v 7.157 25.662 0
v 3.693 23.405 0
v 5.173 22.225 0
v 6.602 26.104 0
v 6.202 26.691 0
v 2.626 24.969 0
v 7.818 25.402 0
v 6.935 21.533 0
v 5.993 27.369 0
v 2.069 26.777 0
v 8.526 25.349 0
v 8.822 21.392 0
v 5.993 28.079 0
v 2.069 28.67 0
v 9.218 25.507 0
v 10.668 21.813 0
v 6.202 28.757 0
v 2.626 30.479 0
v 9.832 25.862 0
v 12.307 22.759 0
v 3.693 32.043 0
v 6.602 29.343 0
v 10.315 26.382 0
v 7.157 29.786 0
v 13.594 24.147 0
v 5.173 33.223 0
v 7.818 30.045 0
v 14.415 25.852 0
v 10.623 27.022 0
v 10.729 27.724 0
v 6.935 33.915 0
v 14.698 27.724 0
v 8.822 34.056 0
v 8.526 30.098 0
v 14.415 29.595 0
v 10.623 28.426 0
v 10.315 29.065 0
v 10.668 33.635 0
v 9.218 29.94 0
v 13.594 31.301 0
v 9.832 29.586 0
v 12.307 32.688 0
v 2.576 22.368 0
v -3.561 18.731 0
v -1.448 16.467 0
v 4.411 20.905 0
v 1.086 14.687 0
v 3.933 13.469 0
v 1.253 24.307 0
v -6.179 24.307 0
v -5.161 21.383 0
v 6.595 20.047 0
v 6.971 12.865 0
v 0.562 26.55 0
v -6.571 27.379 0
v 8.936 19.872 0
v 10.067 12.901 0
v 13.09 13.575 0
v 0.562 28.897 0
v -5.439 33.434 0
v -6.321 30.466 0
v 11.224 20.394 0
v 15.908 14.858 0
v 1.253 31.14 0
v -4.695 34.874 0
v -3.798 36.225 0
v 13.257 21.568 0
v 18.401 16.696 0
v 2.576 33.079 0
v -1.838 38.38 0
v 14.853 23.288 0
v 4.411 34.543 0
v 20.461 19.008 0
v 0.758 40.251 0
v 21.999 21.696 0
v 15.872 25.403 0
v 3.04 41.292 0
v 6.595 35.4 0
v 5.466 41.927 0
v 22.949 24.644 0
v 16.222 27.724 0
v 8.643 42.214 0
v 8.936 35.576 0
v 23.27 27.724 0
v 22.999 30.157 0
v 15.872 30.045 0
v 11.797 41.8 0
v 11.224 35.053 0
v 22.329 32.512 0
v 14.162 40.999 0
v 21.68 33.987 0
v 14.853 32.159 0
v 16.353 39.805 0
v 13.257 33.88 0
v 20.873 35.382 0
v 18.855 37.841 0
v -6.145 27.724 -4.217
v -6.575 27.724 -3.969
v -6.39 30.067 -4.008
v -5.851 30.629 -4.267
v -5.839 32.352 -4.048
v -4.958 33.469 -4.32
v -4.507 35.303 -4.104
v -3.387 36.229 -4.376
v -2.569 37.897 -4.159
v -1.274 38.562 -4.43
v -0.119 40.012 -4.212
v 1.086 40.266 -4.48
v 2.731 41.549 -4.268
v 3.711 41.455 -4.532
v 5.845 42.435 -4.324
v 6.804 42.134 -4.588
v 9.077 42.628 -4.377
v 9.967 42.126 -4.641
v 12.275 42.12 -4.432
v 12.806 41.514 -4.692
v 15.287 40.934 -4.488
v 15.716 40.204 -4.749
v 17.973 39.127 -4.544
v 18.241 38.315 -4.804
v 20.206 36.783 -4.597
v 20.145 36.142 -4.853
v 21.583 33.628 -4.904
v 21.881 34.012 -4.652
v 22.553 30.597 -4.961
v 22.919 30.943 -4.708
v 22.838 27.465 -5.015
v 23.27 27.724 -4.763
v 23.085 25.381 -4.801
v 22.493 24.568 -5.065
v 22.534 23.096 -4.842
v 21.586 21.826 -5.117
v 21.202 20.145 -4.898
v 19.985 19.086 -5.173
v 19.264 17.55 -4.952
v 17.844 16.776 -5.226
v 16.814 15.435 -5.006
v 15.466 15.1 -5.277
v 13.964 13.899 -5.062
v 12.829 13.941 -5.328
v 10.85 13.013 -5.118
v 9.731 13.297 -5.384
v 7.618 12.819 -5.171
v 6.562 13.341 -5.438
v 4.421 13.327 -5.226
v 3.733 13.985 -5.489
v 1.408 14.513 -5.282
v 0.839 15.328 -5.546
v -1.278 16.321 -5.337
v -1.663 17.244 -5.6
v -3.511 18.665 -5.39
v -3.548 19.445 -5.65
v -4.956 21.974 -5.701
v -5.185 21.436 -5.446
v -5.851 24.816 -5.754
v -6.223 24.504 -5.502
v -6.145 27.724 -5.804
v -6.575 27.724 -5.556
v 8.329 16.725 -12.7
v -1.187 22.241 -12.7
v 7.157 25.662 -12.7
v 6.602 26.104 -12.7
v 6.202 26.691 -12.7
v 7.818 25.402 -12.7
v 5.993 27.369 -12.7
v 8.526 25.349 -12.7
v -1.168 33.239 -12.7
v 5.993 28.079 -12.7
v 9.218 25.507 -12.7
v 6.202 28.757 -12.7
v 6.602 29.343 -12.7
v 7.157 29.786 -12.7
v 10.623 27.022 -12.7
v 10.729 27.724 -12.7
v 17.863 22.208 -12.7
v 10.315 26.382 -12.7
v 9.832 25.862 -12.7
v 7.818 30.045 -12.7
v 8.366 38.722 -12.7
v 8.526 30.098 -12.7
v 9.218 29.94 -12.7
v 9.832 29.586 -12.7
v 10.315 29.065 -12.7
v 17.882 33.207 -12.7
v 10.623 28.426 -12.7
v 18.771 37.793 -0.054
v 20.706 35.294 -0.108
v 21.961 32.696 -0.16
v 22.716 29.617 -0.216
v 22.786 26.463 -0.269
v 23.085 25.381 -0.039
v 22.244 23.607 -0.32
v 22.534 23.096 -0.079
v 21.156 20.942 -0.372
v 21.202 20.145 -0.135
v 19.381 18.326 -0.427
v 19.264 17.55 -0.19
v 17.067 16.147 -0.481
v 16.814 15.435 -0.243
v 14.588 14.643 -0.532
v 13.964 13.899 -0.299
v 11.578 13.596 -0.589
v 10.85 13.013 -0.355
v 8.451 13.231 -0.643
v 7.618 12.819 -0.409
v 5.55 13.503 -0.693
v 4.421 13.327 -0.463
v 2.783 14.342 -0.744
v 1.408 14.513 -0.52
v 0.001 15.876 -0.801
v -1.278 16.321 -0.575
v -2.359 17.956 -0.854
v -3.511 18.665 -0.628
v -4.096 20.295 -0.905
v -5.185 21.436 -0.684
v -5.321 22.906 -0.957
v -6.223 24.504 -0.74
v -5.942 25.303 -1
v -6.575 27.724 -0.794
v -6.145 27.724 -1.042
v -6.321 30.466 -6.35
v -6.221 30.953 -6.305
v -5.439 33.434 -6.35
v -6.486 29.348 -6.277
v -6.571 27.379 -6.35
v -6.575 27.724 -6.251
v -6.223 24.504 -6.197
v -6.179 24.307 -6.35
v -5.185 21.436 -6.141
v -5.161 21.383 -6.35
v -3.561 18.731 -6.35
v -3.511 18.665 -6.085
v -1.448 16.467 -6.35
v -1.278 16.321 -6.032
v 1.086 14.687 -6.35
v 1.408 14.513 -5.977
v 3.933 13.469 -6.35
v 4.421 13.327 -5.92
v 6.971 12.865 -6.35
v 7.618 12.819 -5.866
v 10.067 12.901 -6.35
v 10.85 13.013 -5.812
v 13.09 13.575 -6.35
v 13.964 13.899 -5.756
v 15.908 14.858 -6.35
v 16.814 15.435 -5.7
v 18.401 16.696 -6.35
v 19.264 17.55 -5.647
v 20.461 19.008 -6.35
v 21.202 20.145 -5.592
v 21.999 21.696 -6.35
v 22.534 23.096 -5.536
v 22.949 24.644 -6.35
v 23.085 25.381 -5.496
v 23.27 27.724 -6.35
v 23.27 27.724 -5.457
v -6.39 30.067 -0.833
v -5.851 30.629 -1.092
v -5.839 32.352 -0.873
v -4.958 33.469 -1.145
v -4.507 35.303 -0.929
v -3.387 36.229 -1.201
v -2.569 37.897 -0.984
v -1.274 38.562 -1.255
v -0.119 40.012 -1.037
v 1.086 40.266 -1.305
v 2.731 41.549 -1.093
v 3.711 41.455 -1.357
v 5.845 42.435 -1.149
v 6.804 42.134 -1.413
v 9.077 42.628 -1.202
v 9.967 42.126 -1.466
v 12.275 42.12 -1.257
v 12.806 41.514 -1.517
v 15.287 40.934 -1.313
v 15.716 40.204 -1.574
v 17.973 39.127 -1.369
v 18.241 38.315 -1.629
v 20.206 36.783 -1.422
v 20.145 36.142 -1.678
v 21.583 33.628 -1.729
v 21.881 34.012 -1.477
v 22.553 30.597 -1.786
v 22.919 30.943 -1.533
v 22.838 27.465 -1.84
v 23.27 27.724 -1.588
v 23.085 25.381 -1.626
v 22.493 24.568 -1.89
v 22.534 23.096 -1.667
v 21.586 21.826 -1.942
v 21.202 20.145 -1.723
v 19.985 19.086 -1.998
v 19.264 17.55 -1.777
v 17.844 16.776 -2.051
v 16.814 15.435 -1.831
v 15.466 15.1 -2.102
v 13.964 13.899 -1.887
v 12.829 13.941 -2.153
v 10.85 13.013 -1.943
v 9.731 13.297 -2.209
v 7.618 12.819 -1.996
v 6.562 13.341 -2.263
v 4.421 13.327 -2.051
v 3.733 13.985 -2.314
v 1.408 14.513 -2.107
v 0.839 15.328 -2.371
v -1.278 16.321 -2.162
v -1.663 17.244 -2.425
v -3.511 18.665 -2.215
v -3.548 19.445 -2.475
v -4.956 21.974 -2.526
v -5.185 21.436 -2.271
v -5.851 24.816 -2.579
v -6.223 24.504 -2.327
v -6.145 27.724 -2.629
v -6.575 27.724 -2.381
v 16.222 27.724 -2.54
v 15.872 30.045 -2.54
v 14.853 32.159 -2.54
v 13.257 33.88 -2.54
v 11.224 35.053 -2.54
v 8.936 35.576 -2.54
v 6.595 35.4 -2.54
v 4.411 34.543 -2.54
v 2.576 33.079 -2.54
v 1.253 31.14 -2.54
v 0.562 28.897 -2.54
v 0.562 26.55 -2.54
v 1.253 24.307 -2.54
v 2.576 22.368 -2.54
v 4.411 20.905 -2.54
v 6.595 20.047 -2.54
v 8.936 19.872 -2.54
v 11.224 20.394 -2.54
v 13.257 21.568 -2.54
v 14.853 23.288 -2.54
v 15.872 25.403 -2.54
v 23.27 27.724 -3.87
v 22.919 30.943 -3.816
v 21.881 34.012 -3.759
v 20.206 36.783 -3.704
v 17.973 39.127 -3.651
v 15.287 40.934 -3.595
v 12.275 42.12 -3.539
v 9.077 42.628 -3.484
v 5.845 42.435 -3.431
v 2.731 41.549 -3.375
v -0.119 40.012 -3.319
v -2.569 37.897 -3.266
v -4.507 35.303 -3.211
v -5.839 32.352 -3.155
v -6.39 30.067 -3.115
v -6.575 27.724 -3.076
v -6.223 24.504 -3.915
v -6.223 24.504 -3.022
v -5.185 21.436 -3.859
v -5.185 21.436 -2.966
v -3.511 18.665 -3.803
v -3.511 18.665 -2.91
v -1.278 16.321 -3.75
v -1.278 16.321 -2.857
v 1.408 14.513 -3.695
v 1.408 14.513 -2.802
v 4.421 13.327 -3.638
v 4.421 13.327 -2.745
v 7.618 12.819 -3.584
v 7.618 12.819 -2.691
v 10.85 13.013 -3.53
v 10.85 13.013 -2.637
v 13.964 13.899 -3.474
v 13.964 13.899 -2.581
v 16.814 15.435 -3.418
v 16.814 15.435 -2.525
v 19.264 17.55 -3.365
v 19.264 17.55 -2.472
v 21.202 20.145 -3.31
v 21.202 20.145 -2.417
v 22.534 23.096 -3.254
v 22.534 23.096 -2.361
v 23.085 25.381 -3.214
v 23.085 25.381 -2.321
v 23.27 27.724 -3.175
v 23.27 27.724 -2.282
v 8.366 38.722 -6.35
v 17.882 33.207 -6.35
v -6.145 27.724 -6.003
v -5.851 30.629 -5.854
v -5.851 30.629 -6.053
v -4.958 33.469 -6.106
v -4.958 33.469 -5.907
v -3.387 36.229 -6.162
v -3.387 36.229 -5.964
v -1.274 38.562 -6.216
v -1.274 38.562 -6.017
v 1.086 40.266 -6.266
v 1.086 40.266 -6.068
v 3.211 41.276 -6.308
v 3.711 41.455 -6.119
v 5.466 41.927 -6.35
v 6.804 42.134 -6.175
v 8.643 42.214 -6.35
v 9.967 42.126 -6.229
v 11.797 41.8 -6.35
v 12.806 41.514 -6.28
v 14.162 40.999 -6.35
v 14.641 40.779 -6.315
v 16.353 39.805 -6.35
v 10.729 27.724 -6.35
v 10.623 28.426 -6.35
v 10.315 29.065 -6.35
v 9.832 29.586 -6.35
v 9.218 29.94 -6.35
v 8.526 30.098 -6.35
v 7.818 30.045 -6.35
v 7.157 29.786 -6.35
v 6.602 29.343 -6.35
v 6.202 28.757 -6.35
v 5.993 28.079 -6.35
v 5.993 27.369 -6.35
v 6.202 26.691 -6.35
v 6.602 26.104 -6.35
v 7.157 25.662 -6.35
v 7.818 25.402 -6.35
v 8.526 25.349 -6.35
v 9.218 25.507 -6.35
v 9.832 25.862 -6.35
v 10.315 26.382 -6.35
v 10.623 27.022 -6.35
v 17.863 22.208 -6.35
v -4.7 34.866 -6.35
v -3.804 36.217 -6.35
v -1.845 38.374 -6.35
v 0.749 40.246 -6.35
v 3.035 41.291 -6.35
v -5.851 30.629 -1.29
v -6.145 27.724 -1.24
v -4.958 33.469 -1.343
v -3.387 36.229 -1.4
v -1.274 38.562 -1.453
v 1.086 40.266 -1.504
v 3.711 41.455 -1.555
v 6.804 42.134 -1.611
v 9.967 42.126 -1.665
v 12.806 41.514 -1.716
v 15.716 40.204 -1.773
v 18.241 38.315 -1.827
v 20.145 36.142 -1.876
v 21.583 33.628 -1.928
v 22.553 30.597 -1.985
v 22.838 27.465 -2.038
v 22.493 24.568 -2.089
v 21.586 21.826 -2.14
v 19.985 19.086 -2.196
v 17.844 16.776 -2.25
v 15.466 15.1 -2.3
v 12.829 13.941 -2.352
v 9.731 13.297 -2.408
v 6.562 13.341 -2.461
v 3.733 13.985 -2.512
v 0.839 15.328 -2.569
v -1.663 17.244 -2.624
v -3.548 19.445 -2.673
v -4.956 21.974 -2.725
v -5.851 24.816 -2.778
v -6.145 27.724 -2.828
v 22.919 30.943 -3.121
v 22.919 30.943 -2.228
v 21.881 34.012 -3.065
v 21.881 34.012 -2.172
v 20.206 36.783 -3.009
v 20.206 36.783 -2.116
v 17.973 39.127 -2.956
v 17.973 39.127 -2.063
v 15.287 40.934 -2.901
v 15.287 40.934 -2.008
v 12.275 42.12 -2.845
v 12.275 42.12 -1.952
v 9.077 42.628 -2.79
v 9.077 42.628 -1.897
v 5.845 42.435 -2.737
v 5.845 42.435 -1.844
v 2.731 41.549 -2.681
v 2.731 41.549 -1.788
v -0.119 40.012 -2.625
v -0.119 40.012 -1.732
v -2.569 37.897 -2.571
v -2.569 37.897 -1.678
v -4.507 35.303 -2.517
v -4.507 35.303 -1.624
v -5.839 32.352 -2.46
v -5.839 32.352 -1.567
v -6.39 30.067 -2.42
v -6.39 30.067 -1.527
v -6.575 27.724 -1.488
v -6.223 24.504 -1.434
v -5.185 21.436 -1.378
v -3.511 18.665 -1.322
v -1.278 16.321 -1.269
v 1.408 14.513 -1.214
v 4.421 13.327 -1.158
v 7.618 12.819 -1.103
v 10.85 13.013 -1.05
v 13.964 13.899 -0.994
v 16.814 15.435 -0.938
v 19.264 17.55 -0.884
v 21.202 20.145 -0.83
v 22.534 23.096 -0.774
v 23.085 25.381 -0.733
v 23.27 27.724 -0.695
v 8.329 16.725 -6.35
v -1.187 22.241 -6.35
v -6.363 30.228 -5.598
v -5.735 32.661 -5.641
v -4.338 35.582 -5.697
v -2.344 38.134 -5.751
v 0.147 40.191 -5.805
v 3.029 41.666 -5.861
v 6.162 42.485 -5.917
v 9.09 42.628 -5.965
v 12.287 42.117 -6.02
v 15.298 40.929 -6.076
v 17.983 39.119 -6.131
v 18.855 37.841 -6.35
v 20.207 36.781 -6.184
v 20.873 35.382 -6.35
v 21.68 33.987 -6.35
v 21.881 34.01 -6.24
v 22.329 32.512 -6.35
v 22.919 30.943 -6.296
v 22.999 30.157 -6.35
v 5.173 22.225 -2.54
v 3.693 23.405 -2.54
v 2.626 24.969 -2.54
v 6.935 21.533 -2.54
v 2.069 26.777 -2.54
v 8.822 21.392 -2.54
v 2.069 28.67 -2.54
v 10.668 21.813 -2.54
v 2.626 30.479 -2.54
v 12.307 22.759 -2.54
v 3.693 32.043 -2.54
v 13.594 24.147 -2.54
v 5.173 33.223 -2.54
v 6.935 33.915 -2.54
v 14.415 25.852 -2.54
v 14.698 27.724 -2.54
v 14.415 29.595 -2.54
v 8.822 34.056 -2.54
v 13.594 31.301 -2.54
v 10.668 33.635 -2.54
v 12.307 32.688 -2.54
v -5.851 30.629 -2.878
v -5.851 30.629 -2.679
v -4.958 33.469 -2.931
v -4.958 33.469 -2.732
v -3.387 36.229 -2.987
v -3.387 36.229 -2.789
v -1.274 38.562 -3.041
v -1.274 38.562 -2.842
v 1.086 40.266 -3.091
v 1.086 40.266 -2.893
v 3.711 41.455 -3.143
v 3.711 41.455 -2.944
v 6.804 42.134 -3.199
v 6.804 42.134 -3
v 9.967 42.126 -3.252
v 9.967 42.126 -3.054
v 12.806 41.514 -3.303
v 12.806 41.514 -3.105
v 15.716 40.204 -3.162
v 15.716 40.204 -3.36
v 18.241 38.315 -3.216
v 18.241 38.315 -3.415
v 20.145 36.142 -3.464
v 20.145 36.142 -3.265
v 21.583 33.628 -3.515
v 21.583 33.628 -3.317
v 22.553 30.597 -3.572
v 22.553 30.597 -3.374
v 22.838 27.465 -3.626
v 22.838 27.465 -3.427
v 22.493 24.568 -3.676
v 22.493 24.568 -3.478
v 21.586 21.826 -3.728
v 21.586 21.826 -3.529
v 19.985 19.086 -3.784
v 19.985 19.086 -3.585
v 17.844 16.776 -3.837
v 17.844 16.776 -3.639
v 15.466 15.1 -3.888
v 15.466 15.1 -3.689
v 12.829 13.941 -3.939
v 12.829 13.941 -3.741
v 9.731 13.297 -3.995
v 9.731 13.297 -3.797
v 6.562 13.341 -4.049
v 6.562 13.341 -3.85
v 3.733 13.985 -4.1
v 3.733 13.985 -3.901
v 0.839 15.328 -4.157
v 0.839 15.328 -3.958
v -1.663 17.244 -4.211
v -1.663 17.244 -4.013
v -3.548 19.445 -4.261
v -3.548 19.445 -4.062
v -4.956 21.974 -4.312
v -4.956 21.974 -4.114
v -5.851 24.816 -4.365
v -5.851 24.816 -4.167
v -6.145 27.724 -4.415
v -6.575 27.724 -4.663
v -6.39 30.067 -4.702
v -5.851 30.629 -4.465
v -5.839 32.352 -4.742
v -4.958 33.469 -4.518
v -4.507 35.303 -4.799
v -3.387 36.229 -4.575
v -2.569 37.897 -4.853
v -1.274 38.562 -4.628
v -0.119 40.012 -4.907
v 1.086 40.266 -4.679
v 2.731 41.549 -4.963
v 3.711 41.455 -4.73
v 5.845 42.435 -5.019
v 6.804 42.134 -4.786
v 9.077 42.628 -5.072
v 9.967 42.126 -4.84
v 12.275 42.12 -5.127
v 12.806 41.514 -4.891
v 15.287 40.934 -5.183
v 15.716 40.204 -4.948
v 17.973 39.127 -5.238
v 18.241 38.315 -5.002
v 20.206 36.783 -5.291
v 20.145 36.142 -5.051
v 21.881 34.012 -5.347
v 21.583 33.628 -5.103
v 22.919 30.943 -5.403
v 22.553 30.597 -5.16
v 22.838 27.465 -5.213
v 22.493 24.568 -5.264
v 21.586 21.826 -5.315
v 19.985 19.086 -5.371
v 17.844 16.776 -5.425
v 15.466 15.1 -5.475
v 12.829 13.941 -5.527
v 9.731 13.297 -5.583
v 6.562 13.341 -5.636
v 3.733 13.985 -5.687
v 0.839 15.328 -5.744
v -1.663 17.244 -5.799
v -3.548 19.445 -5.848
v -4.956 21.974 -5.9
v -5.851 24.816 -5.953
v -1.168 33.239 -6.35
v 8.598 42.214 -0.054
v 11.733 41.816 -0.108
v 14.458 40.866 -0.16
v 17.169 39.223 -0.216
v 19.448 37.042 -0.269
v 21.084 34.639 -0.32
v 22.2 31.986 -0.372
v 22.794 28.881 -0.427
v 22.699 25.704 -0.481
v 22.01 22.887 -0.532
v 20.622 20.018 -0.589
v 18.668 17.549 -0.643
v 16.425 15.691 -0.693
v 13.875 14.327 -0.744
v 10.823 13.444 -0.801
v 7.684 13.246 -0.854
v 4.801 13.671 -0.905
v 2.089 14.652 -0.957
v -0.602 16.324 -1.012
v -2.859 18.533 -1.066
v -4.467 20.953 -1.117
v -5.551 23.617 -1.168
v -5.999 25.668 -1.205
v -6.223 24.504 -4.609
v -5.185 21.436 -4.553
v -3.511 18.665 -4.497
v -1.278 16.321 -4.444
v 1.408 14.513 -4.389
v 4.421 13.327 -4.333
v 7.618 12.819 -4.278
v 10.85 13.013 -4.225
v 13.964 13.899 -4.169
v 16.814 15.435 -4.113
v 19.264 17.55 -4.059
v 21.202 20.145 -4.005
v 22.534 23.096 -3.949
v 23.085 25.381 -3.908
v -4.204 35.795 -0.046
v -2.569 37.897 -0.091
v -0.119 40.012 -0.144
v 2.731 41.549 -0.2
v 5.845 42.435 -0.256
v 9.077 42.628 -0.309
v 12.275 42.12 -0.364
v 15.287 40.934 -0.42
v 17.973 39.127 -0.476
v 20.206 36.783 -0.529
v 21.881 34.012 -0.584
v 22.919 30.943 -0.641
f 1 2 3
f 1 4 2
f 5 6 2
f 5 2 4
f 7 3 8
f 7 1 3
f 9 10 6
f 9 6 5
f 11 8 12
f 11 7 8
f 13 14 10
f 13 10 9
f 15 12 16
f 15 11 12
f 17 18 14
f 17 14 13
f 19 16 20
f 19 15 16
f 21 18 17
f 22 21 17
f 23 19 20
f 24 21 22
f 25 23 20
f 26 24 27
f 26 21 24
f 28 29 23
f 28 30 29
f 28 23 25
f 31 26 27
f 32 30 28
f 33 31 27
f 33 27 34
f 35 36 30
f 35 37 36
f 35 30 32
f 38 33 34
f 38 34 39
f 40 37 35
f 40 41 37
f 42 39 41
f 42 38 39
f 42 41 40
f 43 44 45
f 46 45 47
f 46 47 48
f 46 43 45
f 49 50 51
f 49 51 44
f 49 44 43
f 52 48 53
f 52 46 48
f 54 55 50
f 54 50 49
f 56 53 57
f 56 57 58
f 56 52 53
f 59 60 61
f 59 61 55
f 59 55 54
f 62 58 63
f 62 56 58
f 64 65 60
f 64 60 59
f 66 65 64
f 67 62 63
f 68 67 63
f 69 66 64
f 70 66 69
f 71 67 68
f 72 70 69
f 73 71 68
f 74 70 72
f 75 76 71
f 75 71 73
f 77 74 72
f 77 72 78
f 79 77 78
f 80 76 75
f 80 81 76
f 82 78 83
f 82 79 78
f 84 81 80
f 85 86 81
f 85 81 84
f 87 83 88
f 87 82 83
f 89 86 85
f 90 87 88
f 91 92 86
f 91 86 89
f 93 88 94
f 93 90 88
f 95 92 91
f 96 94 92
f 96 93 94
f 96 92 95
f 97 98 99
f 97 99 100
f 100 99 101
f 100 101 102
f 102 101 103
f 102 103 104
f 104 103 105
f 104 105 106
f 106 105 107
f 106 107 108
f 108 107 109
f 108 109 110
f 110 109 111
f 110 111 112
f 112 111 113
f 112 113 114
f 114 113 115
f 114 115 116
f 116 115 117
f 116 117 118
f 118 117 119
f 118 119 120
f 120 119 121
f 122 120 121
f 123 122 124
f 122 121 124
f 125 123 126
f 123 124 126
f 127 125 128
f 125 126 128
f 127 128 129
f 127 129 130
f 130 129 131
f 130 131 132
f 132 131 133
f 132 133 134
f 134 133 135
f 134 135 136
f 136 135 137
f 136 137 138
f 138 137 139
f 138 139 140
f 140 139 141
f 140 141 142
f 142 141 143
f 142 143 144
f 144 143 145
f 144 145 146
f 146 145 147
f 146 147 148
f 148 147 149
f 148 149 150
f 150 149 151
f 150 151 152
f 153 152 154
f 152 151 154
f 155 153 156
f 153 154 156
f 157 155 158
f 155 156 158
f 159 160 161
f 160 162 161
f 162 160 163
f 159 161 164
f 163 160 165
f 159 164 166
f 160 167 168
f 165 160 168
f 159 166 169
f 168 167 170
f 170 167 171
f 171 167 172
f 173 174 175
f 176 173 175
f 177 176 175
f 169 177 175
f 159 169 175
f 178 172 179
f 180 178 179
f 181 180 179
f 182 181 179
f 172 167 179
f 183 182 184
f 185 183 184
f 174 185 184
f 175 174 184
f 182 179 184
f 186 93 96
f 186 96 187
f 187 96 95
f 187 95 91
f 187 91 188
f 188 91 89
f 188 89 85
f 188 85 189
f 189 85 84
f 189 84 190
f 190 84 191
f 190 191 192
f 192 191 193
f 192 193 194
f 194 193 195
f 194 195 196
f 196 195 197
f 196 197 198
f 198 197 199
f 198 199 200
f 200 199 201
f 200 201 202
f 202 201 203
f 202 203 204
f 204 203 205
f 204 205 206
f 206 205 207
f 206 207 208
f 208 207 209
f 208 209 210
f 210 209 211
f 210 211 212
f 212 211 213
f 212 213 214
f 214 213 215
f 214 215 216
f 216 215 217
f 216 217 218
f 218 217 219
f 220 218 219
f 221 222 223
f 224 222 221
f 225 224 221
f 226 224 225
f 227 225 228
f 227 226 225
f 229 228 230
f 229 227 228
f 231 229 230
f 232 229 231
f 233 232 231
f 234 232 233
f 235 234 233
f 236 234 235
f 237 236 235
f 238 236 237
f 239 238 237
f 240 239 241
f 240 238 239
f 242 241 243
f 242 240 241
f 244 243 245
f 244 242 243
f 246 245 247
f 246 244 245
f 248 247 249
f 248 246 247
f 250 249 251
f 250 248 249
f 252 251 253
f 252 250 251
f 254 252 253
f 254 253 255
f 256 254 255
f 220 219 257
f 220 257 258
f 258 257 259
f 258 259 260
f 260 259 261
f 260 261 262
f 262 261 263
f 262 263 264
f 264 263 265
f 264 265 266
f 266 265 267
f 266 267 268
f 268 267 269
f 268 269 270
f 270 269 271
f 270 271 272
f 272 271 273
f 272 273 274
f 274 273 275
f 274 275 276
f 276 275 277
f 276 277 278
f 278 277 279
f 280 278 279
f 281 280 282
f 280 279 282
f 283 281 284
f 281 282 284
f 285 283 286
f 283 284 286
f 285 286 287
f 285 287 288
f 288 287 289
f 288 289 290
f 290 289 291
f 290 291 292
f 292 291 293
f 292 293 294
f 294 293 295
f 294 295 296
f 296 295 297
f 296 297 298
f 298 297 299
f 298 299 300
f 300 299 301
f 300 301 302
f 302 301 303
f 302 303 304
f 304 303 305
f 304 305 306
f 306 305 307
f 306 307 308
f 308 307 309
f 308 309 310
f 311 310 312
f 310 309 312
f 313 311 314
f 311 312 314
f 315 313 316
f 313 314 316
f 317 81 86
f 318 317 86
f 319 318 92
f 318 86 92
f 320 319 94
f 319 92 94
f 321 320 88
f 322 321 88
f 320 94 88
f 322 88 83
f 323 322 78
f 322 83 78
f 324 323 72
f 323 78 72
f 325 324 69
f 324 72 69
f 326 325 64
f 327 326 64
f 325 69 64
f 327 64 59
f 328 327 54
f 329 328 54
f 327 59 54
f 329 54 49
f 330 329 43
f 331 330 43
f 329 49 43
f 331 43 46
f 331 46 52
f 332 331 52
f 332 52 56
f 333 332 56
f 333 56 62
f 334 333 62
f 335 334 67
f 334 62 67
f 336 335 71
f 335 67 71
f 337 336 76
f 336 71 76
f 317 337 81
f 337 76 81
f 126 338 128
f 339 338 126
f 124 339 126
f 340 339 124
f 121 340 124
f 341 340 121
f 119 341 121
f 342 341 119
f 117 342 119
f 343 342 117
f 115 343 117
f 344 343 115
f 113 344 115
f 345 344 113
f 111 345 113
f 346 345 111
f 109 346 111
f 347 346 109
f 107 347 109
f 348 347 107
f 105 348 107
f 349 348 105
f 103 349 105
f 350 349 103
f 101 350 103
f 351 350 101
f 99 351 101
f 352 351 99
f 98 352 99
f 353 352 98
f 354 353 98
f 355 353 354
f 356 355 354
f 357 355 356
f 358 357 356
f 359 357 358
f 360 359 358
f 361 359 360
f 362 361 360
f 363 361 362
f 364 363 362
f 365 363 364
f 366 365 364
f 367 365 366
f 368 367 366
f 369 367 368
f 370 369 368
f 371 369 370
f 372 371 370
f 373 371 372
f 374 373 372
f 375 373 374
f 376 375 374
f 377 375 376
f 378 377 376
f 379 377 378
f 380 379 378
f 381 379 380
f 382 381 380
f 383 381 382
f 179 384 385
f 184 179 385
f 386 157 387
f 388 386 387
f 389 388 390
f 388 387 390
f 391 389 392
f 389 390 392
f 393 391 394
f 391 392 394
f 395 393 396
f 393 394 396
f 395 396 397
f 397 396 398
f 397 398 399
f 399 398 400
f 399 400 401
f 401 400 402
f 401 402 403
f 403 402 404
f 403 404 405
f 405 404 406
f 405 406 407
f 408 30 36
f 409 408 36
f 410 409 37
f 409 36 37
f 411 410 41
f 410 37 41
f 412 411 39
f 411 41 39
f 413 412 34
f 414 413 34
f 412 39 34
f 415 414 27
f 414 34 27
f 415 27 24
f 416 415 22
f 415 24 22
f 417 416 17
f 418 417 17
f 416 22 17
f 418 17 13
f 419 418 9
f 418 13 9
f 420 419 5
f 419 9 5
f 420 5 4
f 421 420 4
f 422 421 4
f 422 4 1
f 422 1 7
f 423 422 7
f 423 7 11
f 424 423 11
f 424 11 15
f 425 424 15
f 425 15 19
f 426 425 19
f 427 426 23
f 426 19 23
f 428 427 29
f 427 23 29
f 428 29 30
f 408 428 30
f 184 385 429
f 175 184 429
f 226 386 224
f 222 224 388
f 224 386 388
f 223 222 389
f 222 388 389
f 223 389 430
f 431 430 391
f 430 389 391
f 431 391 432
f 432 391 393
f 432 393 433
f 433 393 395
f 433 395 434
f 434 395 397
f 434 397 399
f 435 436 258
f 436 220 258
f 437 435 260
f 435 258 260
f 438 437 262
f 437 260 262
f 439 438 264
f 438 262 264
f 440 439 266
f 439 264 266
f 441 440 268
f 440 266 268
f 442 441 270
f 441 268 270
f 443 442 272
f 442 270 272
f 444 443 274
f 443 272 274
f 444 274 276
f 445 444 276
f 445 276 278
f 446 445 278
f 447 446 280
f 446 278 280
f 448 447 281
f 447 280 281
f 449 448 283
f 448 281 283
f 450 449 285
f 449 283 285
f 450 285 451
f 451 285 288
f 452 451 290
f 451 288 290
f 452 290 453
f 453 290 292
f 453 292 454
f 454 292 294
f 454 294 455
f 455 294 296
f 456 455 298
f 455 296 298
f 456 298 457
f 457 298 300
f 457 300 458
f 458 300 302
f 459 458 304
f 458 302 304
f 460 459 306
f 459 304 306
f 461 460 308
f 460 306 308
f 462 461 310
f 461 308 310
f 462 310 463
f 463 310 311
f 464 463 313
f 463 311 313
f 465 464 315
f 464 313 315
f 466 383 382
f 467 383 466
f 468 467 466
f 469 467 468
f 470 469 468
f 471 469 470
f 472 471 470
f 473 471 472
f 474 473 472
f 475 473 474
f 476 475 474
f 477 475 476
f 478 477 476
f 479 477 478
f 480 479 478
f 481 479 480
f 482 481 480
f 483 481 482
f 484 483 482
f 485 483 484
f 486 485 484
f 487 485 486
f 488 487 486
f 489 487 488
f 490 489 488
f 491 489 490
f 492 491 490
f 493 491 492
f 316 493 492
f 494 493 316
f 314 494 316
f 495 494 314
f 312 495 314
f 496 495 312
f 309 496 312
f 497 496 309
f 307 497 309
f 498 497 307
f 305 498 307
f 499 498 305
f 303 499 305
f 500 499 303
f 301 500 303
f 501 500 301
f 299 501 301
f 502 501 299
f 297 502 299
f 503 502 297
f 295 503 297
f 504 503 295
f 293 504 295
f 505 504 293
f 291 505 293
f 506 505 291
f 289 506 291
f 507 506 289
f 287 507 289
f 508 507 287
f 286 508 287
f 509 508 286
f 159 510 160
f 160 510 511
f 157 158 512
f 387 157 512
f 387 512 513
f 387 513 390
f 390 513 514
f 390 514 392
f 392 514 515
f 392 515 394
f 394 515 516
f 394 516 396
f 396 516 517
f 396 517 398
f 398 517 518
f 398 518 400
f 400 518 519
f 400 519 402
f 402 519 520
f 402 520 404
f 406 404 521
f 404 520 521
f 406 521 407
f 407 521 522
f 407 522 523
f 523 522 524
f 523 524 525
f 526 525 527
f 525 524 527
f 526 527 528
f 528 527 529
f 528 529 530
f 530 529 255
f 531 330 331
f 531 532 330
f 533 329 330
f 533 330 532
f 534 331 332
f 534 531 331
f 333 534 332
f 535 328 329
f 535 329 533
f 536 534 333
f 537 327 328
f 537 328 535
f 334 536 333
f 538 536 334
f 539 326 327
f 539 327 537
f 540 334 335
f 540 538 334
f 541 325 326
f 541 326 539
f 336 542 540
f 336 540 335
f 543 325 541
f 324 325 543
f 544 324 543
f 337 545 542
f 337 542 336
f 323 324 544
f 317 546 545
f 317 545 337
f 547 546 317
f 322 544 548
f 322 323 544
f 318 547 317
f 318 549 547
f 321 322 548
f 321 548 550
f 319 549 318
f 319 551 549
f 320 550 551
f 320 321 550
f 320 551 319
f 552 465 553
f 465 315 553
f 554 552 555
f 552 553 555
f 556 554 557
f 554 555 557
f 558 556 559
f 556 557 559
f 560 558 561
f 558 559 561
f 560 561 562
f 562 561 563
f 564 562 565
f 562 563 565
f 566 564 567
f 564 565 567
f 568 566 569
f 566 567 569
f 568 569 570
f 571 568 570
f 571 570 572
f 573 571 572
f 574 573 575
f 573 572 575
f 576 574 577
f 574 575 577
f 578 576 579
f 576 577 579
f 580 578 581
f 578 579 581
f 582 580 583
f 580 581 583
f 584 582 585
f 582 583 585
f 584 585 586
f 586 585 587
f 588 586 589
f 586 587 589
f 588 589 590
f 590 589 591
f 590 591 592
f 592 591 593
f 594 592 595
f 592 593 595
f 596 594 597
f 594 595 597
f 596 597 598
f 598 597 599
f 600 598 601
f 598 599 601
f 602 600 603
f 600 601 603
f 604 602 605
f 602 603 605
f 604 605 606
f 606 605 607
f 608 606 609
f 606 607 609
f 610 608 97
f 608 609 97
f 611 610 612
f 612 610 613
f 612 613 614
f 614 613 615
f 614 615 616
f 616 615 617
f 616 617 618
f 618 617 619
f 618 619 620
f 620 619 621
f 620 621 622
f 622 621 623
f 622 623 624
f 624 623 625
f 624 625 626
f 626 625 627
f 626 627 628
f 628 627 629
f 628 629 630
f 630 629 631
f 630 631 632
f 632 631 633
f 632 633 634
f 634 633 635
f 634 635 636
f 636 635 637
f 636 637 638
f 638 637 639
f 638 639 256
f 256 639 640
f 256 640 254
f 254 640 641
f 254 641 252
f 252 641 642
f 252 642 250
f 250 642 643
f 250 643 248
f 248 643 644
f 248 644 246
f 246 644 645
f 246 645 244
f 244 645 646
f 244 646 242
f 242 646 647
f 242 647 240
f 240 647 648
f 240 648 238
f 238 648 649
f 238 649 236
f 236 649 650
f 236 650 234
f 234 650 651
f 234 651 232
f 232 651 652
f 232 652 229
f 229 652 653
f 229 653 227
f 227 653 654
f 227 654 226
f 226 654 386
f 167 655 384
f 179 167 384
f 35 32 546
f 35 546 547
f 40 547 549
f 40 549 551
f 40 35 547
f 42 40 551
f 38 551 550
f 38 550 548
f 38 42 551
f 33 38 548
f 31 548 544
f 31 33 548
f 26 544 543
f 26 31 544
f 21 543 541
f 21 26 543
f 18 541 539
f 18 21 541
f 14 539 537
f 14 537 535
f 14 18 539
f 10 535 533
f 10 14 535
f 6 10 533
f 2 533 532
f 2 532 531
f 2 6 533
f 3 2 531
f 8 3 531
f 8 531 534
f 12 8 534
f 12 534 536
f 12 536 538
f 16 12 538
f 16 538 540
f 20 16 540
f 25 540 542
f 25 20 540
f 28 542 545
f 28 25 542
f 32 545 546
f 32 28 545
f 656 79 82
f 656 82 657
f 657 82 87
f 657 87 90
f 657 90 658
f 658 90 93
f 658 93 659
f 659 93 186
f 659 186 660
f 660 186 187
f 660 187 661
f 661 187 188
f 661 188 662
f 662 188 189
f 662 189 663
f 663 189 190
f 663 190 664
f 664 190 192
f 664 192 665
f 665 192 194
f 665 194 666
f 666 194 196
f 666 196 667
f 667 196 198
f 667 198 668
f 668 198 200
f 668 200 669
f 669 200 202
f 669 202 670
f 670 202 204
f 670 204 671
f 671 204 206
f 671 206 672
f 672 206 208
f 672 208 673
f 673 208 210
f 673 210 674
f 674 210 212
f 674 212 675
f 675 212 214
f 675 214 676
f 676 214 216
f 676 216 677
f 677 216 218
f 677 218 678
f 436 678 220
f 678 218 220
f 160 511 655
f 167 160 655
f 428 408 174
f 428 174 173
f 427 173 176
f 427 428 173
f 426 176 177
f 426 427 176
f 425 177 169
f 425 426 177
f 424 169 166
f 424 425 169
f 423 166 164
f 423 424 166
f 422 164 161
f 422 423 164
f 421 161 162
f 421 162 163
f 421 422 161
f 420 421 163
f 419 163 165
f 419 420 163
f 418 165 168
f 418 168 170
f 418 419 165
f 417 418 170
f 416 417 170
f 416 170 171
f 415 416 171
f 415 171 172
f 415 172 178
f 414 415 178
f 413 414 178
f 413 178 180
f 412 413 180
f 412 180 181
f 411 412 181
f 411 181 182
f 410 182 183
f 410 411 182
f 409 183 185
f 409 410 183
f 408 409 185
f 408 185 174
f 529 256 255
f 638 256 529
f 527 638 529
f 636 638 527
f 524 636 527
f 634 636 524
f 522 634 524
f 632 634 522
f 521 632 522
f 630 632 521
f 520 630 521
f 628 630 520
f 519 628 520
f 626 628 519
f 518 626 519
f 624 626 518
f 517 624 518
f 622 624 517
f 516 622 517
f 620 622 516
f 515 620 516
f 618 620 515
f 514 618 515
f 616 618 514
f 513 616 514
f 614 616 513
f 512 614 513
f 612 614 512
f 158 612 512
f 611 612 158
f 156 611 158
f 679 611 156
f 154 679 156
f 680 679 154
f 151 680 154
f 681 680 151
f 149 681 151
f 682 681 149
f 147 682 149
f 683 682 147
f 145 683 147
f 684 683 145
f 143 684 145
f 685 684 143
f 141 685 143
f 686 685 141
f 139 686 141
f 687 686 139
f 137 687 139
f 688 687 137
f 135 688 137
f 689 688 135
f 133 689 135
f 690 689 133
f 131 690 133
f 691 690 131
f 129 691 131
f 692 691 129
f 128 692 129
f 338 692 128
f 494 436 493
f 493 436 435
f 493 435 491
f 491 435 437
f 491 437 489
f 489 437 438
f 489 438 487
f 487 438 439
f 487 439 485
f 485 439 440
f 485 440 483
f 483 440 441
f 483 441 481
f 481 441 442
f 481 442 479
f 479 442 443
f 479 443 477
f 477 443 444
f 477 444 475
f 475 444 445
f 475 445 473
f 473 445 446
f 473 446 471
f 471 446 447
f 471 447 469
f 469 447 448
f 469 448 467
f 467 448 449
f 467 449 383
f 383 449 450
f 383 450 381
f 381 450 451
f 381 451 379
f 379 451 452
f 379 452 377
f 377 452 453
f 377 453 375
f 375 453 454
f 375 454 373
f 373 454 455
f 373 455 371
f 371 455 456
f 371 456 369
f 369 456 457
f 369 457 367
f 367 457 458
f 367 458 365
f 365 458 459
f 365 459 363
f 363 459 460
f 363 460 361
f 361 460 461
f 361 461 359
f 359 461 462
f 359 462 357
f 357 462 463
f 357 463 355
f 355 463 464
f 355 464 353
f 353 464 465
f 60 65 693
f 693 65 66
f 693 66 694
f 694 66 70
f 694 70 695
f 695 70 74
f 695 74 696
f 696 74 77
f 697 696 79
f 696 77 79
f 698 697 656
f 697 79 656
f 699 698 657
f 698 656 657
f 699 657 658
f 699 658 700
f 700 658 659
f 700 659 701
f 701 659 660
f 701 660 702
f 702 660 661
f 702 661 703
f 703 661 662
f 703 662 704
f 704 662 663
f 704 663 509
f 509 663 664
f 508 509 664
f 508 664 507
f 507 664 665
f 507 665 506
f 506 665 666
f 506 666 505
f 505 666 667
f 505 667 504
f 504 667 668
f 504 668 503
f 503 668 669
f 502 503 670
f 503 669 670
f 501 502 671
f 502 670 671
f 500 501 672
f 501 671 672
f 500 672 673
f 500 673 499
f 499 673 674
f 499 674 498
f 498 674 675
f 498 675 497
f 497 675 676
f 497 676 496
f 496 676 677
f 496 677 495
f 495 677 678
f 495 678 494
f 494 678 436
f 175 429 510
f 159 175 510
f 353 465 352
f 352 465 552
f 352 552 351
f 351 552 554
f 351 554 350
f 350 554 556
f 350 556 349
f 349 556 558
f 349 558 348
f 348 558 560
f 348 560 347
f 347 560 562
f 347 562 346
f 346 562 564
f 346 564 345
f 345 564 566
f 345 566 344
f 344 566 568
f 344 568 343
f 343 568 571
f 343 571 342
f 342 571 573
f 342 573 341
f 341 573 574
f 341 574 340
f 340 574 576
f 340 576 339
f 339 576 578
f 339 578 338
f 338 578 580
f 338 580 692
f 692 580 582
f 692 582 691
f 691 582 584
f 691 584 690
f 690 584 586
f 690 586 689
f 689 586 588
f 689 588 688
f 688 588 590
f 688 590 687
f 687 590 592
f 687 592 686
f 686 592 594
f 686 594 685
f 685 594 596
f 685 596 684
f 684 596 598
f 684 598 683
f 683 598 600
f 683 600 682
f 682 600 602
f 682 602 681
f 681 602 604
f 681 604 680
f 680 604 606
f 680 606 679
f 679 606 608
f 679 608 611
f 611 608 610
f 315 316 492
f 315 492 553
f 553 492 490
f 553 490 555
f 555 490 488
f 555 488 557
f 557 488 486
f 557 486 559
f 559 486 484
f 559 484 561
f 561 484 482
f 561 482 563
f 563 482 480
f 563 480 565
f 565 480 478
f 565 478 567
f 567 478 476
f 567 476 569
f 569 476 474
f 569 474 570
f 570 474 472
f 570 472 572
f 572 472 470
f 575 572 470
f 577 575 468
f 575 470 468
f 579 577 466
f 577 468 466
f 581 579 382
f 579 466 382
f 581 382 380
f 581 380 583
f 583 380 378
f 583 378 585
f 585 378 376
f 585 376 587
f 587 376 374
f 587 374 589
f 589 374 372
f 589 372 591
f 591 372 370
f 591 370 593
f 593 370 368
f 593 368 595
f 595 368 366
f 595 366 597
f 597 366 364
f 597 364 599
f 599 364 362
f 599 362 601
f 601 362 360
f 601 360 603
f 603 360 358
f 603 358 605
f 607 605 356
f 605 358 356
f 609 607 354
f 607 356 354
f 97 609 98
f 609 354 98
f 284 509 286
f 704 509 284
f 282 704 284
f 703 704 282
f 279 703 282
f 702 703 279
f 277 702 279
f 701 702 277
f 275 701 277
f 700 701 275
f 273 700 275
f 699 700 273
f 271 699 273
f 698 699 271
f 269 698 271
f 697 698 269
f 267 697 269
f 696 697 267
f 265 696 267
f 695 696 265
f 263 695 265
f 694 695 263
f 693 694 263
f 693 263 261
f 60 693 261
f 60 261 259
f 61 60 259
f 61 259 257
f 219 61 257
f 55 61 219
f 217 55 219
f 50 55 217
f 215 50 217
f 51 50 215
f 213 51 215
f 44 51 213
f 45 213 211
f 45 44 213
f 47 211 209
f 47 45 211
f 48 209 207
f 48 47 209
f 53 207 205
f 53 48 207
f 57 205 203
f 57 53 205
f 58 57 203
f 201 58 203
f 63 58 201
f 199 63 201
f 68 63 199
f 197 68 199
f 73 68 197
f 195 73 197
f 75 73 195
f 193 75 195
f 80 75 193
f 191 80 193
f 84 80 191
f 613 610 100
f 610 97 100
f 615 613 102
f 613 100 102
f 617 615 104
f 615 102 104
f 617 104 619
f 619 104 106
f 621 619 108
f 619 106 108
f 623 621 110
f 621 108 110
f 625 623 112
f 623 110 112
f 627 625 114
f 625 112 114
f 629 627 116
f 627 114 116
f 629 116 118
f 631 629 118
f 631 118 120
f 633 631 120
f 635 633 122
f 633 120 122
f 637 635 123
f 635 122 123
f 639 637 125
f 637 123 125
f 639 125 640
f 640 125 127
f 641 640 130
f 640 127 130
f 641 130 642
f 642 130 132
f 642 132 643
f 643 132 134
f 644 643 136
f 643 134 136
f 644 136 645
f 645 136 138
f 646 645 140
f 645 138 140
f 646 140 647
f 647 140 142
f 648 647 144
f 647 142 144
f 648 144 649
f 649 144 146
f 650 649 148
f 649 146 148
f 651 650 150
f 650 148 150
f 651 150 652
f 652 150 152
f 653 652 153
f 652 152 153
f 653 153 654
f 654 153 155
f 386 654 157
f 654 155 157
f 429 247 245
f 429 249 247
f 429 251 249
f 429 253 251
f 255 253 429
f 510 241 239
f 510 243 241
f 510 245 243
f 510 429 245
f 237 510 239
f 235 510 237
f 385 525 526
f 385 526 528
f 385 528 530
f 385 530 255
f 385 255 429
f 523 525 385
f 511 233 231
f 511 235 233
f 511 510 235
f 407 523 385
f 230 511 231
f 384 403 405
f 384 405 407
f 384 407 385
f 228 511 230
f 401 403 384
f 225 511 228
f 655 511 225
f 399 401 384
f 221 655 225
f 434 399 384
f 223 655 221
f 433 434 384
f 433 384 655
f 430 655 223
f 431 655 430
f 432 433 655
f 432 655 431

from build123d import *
from build123d.topology import SkipClean

# Parameters (mm, degrees)
SKETCH3_R           = 14.9225
BOSS_EXTRUDE1_DEPTH = 12.7
SKETCH11_R          = 2.38125
CUT_EXTRUDE3_DEPTH  = 6.35
SKETCH12_R          = 7.874
SKETCH12_R_2        = 6.35
CUT_EXTRUDE4_DEPTH  = 2.54
THREAD1_PITCH       = 1.5875
CUT_EXTRUDE5_START  = -6.35
SKETCH13_R          = 2.38125
CUT_EXTRUDE5_DEPTH  = 6.35
CUT_EXTRUDE6_START  = -6.35
SKETCH14_R          = 14.9225
CUT_EXTRUDE6_DEPTH  = 6.35


with BuildPart() as part:
    # Sketch3 → Boss-Extrude1 (new body)
    with BuildSketch(Plane.XY):
        with Locations((8.347593151, 27.723781851)):
            Circle(SKETCH3_R)
    extrude(amount=-BOSS_EXTRUDE1_DEPTH)

    # Sketch11 → Cut-Extrude3 (cut)
    with BuildSketch(Plane.XY):
        with Locations((8.347593151, 27.723781851)):
            Circle(SKETCH11_R)
    extrude(amount=-CUT_EXTRUDE3_DEPTH, mode=Mode.SUBTRACT)

    # Sketch12 → Cut-Extrude4 (cut)
    with BuildSketch(Plane.XY):
        with Locations((8.347593151, 27.723781851)):
            Circle(SKETCH12_R)
        with Locations((8.347593151, 27.723781851)):
            Circle(SKETCH12_R_2, mode=Mode.SUBTRACT)
    extrude(amount=-CUT_EXTRUDE4_DEPTH, mode=Mode.SUBTRACT)

    # Thread1: the profile of Thread Profile1 profile screwed along a right-hand helix of 4.8 turns, 8 arcs to a turn; built about Z, then put on its axis
    thread1_z = Axis((0, 0, 0), (0, 0, 1))
    thread1_corners = [(14.9228, 0, -0.000173205), (14.9228, 0, 0.694704453), (14.492870212, 0, 0.446484374), (14.492870212, 0, 0.248046874)]
    with BuildLine(mode=Mode.PRIVATE) as thread1_profile:
        Line(thread1_corners[0], thread1_corners[1])
        Line(thread1_corners[1], thread1_corners[2])
        Line(thread1_corners[2], thread1_corners[3])
        Line(thread1_corners[3], thread1_corners[0])
    thread1_cap = Face(thread1_profile.wire())
    thread1_turn_angles = [0, 22.5, 45, 67.5, 90, 112.5, 135, 157.5, 180, 202.5, 225, 247.5, 270, 292.5, 315, 337.5, 360]
    thread1_turn_weights = [1, 0.9238795325112867, 1, 0.9238795325112867, 1, 0.9238795325112867, 1, 0.9238795325112867, 1, 0.9238795325112867, 1, 0.9238795325112867, 1, 0.9238795325112867, 1, 0.9238795325112867, 1]
    thread1_turn_rails = [Edge.make_bspline([Vector(p[0], p[1], 0).rotate(thread1_z, thread1_turn_angles[k]) / thread1_turn_weights[k] + Vector(0, 0, p[2] + THREAD1_PITCH * thread1_turn_angles[k] / 360) for k in range(17)], [0, 0, 0, 1, 1, 2, 2, 3, 3, 4, 4, 5, 5, 6, 6, 7, 7, 8, 8, 8], 2, thread1_turn_weights) for p in thread1_corners]
    thread1_turn_sides = [Face.make_surface_from_curves(thread1_turn_rails[p[0]], thread1_turn_rails[p[1]]) for p in [(0, 1), (1, 2), (2, 3), (3, 0)]]
    thread1_last_angles = [1440, 1462.5, 1485, 1507.5, 1530, 1552.5, 1575, 1597.5, 1620, 1642.5, 1665, 1687.5, 1710, 1719, 1728]
    thread1_last_weights = [1, 0.9238795325112867, 1, 0.9238795325112867, 1, 0.9238795325112867, 1, 0.9238795325112867, 1, 0.9238795325112867, 1, 0.9238795325112867, 1, 0.9876883405951378, 1]
    thread1_last_rails = [Edge.make_bspline([Vector(p[0], p[1], 0).rotate(thread1_z, thread1_last_angles[k]) / thread1_last_weights[k] + Vector(0, 0, p[2] + THREAD1_PITCH * thread1_last_angles[k] / 360) for k in range(15)], [0, 0, 0, 1, 1, 2, 2, 3, 3, 4, 4, 5, 5, 6, 6, 7, 7, 7], 2, thread1_last_weights) for p in thread1_corners]
    thread1_last_sides = [Face.make_surface_from_curves(thread1_last_rails[p[0]], thread1_last_rails[p[1]]) for p in [(0, 1), (1, 2), (2, 3), (3, 0)]]
    thread1 = Plane(origin=(8.347593151, 27.723781851, 0.79375), x_dir=(-1, 0, 0), z_dir=(0, 0, -1)) * Solid(Shell([*[p.moved(Location((0, 0, THREAD1_PITCH * i))) for i in range(4) for p in thread1_turn_sides], *thread1_last_sides, thread1_cap, thread1_cap.rotate(thread1_z, 1728).moved(Location((0, 0, THREAD1_PITCH * 1728 / 360)))]))
    add(thread1, mode=Mode.SUBTRACT)

    # Sketch13 → Cut-Extrude5 (cut)
    with BuildSketch(Plane(origin=(0, 0, -12.7), x_dir=(-1, 0, 0), z_dir=(0, 0, -1)).offset(CUT_EXTRUDE5_START)):
        with Locations(Location((-8.347593151, 27.723781851, 0), (0, 0, 180))):
            Circle(SKETCH13_R)
    extrude(amount=CUT_EXTRUDE5_DEPTH, mode=Mode.SUBTRACT)

    # Sketch14 → Cut-Extrude6 (cut)
    with SkipClean():  # the faces are left unmerged after this step: merging them gives an invalid solid
        with BuildSketch(Plane(origin=(0, 0, -12.7), x_dir=(-1, 0, 0), z_dir=(0, 0, -1)).offset(CUT_EXTRUDE6_START)):
            with Locations((-8.347593151, 27.723781851)):
                Circle(SKETCH14_R)
            Polygon((1.186658464, 22.240576024), (1.168128197, 33.239083042), (-8.366123418, 38.722288869), (-17.881844766, 33.206987678), (-17.863314499, 22.20848066), (-8.329062884, 16.725274833), align=None, mode=Mode.SUBTRACT)
        extrude(amount=CUT_EXTRUDE6_DEPTH, mode=Mode.SUBTRACT)
    add(part.part.scale(1), mode=Mode.REPLACE)  # the faces are merged on a copy


solid = part.part
